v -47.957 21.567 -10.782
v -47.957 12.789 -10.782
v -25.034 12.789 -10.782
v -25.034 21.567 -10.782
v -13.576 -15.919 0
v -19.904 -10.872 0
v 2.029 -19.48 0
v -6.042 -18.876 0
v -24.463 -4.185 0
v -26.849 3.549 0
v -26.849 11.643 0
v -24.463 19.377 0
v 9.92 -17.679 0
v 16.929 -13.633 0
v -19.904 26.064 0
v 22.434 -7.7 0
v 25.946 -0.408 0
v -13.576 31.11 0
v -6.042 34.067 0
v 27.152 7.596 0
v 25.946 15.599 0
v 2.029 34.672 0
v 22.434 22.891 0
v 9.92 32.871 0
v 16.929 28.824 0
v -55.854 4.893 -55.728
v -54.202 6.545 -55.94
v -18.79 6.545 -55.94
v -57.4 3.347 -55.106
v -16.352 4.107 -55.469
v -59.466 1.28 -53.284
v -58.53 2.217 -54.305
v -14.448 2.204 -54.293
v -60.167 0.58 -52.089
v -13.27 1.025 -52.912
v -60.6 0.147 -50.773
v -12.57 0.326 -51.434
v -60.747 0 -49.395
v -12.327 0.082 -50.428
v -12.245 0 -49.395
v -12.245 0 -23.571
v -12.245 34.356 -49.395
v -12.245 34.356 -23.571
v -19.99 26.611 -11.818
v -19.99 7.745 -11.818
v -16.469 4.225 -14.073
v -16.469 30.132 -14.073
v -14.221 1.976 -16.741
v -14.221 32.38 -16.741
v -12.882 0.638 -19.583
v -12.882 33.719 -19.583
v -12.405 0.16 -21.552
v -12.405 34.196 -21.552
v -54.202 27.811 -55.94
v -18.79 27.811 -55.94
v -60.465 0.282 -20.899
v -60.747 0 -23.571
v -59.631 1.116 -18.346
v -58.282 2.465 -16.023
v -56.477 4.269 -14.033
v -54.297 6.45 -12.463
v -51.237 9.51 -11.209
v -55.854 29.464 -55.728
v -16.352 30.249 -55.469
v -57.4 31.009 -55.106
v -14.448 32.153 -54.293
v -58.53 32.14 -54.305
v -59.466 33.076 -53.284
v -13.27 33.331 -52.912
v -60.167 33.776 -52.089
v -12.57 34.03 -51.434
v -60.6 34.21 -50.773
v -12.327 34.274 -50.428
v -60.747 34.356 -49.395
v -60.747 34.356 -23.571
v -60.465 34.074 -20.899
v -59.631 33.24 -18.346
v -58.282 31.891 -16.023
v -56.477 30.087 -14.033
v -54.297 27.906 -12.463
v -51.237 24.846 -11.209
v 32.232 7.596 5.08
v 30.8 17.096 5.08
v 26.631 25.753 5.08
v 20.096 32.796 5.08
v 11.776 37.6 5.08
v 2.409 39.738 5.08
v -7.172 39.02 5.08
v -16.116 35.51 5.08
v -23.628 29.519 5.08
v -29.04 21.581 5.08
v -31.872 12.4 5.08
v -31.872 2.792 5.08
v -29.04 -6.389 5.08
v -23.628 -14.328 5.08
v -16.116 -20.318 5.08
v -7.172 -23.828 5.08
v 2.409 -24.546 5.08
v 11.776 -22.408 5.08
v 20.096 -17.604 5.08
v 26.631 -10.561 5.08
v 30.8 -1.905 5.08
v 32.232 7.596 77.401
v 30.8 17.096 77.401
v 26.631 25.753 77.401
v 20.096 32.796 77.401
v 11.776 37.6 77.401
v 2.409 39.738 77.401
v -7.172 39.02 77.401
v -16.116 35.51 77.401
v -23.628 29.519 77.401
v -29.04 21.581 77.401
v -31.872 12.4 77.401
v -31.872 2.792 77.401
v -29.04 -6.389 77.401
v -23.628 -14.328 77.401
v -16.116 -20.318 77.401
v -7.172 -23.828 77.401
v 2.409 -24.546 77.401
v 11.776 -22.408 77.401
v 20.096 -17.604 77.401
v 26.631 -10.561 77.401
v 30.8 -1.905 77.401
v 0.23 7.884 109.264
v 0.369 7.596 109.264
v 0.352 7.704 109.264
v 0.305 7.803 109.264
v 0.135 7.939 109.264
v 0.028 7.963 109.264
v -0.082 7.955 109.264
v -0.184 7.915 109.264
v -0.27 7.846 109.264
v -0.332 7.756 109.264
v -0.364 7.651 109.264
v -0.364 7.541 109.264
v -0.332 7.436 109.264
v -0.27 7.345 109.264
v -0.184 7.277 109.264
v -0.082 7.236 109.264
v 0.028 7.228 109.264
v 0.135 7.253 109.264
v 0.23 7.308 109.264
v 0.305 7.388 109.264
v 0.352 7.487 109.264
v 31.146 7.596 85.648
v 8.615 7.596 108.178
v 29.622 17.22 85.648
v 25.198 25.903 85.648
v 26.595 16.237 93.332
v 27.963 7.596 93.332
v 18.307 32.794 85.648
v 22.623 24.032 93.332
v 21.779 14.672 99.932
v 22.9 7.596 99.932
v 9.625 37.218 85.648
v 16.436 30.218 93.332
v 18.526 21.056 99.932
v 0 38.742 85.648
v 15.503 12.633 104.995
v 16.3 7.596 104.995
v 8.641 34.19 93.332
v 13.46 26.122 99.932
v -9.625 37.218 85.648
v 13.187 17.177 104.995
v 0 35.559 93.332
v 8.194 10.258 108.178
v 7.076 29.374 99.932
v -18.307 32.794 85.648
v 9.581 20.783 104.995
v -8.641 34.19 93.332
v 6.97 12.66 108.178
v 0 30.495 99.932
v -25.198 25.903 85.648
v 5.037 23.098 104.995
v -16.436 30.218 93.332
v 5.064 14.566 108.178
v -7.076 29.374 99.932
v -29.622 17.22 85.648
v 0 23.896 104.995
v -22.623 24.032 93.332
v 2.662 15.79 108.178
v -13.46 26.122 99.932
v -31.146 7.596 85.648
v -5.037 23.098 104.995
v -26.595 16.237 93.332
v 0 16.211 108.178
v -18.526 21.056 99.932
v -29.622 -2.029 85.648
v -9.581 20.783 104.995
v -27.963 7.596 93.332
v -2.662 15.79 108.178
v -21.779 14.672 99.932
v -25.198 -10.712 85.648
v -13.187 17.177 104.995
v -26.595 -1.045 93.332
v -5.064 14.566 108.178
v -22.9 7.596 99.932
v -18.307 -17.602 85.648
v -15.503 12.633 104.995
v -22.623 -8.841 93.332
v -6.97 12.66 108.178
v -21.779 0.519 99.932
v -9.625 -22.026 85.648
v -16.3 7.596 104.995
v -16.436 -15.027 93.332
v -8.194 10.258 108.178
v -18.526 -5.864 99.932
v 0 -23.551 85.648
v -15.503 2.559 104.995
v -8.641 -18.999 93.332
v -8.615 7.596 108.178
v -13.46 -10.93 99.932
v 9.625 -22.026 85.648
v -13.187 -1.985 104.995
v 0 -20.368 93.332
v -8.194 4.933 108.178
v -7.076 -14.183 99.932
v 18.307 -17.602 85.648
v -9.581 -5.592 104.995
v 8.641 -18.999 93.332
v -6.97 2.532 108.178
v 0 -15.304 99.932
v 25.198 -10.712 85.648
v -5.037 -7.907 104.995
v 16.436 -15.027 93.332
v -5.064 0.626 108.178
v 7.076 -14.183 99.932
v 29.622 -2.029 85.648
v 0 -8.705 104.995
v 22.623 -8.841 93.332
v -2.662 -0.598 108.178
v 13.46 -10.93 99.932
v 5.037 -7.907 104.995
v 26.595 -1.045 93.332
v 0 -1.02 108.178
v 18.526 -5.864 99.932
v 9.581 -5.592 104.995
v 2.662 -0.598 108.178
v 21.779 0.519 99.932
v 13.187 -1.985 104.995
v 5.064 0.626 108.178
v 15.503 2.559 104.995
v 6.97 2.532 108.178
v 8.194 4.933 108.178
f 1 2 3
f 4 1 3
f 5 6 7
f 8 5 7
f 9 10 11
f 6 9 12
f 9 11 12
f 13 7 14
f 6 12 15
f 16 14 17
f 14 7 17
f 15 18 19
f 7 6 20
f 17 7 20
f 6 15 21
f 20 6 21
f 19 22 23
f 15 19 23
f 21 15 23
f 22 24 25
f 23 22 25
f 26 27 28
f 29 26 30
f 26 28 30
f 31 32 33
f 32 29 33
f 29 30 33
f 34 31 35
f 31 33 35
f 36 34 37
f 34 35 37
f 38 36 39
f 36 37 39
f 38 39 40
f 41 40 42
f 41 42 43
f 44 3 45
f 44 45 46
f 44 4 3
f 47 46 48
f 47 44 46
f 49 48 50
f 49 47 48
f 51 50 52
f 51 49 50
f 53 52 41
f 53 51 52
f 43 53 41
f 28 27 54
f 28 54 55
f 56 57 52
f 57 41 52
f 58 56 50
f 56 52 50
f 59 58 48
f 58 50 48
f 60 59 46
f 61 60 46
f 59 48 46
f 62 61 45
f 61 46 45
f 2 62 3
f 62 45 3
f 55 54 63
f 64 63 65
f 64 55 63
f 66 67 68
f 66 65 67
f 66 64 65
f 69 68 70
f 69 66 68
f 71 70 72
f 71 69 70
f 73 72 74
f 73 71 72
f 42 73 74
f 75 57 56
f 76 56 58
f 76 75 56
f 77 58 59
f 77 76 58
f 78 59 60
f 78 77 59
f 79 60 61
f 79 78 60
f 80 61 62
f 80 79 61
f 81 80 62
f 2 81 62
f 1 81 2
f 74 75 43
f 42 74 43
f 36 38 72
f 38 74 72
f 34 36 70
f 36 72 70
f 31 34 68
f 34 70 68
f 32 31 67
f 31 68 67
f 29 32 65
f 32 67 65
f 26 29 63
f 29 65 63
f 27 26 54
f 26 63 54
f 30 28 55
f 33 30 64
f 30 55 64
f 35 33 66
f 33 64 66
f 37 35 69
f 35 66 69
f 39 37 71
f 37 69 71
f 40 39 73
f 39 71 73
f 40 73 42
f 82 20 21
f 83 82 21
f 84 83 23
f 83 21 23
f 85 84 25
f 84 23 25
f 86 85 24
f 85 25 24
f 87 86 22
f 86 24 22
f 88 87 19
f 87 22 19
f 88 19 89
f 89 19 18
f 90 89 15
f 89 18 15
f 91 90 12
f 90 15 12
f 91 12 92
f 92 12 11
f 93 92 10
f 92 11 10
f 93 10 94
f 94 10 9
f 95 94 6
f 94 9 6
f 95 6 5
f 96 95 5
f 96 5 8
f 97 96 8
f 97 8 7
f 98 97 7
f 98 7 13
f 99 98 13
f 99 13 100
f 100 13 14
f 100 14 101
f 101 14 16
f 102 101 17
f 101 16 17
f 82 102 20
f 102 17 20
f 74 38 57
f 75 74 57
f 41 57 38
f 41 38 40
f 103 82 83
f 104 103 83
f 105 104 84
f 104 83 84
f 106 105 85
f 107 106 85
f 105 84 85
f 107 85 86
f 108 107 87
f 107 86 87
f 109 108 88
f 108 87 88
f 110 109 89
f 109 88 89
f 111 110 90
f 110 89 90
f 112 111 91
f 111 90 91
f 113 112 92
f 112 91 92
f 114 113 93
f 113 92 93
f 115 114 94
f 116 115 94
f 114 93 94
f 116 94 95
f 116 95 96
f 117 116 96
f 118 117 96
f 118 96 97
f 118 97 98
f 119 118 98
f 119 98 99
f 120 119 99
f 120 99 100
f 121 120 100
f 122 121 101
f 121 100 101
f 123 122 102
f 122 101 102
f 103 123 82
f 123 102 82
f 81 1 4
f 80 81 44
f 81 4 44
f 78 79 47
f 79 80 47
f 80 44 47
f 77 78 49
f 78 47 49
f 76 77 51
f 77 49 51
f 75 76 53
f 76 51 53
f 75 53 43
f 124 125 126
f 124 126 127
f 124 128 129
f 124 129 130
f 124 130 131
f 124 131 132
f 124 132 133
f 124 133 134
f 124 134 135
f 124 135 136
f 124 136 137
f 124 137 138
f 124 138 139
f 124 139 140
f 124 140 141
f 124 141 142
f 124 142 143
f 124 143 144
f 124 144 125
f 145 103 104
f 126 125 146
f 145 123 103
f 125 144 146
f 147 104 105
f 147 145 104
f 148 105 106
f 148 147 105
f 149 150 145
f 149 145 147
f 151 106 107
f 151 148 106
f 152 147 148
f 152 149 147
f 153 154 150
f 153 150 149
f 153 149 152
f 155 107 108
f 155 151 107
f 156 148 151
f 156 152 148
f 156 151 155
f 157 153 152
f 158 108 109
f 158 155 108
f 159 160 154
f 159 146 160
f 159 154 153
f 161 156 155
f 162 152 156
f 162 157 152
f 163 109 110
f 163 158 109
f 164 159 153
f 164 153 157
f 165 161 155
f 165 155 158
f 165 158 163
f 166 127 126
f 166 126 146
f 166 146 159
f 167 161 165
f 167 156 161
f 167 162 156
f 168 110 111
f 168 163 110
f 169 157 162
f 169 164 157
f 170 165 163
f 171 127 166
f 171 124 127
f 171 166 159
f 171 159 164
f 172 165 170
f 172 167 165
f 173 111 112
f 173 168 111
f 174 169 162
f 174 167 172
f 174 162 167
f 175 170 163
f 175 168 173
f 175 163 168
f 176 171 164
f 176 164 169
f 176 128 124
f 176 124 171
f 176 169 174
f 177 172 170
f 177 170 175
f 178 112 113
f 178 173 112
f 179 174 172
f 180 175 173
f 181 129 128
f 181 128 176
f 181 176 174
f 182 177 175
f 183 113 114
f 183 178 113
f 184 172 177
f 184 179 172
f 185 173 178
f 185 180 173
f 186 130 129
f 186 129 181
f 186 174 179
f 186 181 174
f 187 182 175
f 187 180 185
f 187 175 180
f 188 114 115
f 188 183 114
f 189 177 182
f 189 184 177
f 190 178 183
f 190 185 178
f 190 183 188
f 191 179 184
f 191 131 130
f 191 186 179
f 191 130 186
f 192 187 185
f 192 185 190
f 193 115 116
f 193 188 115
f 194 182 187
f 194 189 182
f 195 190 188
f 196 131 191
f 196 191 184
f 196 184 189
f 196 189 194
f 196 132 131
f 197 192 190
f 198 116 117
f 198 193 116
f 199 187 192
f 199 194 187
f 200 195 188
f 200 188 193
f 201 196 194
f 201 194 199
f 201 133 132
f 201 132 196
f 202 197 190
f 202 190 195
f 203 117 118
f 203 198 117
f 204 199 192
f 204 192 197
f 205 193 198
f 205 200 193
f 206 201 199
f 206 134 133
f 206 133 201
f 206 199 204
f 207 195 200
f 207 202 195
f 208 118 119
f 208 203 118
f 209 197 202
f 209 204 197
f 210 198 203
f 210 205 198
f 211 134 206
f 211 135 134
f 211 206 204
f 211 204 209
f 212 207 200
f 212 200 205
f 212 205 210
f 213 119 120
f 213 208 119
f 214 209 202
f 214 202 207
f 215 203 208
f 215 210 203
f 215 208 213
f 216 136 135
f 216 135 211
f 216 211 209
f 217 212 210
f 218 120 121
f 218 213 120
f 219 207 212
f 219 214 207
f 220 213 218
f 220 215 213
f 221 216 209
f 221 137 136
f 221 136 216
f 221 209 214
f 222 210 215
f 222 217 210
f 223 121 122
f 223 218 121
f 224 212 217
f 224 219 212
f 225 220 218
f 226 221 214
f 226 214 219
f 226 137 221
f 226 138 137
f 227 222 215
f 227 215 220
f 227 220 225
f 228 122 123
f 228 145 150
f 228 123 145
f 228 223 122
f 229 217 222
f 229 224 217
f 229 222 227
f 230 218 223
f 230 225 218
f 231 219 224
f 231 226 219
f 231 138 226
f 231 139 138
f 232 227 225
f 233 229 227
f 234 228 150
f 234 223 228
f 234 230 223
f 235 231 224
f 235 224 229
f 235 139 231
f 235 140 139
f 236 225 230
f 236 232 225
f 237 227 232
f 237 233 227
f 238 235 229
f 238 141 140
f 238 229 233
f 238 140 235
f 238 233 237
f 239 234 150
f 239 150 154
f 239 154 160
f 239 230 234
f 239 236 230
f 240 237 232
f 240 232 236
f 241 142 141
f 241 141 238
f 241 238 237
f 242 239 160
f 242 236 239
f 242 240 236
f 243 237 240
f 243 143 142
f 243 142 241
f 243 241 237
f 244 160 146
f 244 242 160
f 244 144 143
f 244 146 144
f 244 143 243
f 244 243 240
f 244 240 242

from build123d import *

# Parameters (mm, degrees)
F0_R     = 32.232138
F1_DEPTH = 109.264171
F2_W     = 48.502128
F2_H     = 45.15865
F3_DEPTH = 34.356315
F4_R     = 6.545236
F5_R     = 12.789297
F6_R     = 31.863537
F7_SIZE  = 5.08


with BuildPart() as f1:
    # F0 (on Top) → F1 (new body)
    with BuildSketch(Plane.XY):
        with Locations((0, 7.595725)):
            Circle(F0_R)
    extrude(amount=F1_DEPTH)

    # F6
    f6_edges = [f1.edges().sort_by_distance(p)[0] for p in [
        (-32.232138, 7.595725, 109.264171),
    ]]
    fillet(f6_edges, radius=F6_R)

    # F7
    f7_edges = [f1.edges().sort_by_distance(p)[0] for p in [
        (-32.232138, 7.595725, 0),
    ]]
    chamfer(f7_edges, length=F7_SIZE)


with BuildPart() as f3:
    # F2 (on Front) → F3 (new body)
    with BuildSketch(Plane.XZ):
        with Locations((-36.495721, -33.36096)):
            Rectangle(F2_W, F2_H)
    extrude(amount=-F3_DEPTH)

    # F4
    f4_edges = [f3.edges().sort_by_distance(p)[0] for p in [
        (-60.746785, 17.178157, -55.940285),
        (-12.244657, 17.178157, -55.940285),
        (-36.495721, 0, -55.940285),
        (-36.495721, 34.356315, -55.940285),
    ]]
    fillet(f4_edges, radius=F4_R)

    # F5
    f5_edges = [f3.edges().sort_by_distance(p)[0] for p in [
        (-12.244657, 17.178157, -10.781635),
        (-60.746785, 17.178157, -10.781635),
        (-36.495721, 0, -10.781635),
        (-36.495721, 34.356315, -10.781635),
    ]]
    fillet(f5_edges, radius=F5_R)


solid = Compound([f1.part, f3.part])
